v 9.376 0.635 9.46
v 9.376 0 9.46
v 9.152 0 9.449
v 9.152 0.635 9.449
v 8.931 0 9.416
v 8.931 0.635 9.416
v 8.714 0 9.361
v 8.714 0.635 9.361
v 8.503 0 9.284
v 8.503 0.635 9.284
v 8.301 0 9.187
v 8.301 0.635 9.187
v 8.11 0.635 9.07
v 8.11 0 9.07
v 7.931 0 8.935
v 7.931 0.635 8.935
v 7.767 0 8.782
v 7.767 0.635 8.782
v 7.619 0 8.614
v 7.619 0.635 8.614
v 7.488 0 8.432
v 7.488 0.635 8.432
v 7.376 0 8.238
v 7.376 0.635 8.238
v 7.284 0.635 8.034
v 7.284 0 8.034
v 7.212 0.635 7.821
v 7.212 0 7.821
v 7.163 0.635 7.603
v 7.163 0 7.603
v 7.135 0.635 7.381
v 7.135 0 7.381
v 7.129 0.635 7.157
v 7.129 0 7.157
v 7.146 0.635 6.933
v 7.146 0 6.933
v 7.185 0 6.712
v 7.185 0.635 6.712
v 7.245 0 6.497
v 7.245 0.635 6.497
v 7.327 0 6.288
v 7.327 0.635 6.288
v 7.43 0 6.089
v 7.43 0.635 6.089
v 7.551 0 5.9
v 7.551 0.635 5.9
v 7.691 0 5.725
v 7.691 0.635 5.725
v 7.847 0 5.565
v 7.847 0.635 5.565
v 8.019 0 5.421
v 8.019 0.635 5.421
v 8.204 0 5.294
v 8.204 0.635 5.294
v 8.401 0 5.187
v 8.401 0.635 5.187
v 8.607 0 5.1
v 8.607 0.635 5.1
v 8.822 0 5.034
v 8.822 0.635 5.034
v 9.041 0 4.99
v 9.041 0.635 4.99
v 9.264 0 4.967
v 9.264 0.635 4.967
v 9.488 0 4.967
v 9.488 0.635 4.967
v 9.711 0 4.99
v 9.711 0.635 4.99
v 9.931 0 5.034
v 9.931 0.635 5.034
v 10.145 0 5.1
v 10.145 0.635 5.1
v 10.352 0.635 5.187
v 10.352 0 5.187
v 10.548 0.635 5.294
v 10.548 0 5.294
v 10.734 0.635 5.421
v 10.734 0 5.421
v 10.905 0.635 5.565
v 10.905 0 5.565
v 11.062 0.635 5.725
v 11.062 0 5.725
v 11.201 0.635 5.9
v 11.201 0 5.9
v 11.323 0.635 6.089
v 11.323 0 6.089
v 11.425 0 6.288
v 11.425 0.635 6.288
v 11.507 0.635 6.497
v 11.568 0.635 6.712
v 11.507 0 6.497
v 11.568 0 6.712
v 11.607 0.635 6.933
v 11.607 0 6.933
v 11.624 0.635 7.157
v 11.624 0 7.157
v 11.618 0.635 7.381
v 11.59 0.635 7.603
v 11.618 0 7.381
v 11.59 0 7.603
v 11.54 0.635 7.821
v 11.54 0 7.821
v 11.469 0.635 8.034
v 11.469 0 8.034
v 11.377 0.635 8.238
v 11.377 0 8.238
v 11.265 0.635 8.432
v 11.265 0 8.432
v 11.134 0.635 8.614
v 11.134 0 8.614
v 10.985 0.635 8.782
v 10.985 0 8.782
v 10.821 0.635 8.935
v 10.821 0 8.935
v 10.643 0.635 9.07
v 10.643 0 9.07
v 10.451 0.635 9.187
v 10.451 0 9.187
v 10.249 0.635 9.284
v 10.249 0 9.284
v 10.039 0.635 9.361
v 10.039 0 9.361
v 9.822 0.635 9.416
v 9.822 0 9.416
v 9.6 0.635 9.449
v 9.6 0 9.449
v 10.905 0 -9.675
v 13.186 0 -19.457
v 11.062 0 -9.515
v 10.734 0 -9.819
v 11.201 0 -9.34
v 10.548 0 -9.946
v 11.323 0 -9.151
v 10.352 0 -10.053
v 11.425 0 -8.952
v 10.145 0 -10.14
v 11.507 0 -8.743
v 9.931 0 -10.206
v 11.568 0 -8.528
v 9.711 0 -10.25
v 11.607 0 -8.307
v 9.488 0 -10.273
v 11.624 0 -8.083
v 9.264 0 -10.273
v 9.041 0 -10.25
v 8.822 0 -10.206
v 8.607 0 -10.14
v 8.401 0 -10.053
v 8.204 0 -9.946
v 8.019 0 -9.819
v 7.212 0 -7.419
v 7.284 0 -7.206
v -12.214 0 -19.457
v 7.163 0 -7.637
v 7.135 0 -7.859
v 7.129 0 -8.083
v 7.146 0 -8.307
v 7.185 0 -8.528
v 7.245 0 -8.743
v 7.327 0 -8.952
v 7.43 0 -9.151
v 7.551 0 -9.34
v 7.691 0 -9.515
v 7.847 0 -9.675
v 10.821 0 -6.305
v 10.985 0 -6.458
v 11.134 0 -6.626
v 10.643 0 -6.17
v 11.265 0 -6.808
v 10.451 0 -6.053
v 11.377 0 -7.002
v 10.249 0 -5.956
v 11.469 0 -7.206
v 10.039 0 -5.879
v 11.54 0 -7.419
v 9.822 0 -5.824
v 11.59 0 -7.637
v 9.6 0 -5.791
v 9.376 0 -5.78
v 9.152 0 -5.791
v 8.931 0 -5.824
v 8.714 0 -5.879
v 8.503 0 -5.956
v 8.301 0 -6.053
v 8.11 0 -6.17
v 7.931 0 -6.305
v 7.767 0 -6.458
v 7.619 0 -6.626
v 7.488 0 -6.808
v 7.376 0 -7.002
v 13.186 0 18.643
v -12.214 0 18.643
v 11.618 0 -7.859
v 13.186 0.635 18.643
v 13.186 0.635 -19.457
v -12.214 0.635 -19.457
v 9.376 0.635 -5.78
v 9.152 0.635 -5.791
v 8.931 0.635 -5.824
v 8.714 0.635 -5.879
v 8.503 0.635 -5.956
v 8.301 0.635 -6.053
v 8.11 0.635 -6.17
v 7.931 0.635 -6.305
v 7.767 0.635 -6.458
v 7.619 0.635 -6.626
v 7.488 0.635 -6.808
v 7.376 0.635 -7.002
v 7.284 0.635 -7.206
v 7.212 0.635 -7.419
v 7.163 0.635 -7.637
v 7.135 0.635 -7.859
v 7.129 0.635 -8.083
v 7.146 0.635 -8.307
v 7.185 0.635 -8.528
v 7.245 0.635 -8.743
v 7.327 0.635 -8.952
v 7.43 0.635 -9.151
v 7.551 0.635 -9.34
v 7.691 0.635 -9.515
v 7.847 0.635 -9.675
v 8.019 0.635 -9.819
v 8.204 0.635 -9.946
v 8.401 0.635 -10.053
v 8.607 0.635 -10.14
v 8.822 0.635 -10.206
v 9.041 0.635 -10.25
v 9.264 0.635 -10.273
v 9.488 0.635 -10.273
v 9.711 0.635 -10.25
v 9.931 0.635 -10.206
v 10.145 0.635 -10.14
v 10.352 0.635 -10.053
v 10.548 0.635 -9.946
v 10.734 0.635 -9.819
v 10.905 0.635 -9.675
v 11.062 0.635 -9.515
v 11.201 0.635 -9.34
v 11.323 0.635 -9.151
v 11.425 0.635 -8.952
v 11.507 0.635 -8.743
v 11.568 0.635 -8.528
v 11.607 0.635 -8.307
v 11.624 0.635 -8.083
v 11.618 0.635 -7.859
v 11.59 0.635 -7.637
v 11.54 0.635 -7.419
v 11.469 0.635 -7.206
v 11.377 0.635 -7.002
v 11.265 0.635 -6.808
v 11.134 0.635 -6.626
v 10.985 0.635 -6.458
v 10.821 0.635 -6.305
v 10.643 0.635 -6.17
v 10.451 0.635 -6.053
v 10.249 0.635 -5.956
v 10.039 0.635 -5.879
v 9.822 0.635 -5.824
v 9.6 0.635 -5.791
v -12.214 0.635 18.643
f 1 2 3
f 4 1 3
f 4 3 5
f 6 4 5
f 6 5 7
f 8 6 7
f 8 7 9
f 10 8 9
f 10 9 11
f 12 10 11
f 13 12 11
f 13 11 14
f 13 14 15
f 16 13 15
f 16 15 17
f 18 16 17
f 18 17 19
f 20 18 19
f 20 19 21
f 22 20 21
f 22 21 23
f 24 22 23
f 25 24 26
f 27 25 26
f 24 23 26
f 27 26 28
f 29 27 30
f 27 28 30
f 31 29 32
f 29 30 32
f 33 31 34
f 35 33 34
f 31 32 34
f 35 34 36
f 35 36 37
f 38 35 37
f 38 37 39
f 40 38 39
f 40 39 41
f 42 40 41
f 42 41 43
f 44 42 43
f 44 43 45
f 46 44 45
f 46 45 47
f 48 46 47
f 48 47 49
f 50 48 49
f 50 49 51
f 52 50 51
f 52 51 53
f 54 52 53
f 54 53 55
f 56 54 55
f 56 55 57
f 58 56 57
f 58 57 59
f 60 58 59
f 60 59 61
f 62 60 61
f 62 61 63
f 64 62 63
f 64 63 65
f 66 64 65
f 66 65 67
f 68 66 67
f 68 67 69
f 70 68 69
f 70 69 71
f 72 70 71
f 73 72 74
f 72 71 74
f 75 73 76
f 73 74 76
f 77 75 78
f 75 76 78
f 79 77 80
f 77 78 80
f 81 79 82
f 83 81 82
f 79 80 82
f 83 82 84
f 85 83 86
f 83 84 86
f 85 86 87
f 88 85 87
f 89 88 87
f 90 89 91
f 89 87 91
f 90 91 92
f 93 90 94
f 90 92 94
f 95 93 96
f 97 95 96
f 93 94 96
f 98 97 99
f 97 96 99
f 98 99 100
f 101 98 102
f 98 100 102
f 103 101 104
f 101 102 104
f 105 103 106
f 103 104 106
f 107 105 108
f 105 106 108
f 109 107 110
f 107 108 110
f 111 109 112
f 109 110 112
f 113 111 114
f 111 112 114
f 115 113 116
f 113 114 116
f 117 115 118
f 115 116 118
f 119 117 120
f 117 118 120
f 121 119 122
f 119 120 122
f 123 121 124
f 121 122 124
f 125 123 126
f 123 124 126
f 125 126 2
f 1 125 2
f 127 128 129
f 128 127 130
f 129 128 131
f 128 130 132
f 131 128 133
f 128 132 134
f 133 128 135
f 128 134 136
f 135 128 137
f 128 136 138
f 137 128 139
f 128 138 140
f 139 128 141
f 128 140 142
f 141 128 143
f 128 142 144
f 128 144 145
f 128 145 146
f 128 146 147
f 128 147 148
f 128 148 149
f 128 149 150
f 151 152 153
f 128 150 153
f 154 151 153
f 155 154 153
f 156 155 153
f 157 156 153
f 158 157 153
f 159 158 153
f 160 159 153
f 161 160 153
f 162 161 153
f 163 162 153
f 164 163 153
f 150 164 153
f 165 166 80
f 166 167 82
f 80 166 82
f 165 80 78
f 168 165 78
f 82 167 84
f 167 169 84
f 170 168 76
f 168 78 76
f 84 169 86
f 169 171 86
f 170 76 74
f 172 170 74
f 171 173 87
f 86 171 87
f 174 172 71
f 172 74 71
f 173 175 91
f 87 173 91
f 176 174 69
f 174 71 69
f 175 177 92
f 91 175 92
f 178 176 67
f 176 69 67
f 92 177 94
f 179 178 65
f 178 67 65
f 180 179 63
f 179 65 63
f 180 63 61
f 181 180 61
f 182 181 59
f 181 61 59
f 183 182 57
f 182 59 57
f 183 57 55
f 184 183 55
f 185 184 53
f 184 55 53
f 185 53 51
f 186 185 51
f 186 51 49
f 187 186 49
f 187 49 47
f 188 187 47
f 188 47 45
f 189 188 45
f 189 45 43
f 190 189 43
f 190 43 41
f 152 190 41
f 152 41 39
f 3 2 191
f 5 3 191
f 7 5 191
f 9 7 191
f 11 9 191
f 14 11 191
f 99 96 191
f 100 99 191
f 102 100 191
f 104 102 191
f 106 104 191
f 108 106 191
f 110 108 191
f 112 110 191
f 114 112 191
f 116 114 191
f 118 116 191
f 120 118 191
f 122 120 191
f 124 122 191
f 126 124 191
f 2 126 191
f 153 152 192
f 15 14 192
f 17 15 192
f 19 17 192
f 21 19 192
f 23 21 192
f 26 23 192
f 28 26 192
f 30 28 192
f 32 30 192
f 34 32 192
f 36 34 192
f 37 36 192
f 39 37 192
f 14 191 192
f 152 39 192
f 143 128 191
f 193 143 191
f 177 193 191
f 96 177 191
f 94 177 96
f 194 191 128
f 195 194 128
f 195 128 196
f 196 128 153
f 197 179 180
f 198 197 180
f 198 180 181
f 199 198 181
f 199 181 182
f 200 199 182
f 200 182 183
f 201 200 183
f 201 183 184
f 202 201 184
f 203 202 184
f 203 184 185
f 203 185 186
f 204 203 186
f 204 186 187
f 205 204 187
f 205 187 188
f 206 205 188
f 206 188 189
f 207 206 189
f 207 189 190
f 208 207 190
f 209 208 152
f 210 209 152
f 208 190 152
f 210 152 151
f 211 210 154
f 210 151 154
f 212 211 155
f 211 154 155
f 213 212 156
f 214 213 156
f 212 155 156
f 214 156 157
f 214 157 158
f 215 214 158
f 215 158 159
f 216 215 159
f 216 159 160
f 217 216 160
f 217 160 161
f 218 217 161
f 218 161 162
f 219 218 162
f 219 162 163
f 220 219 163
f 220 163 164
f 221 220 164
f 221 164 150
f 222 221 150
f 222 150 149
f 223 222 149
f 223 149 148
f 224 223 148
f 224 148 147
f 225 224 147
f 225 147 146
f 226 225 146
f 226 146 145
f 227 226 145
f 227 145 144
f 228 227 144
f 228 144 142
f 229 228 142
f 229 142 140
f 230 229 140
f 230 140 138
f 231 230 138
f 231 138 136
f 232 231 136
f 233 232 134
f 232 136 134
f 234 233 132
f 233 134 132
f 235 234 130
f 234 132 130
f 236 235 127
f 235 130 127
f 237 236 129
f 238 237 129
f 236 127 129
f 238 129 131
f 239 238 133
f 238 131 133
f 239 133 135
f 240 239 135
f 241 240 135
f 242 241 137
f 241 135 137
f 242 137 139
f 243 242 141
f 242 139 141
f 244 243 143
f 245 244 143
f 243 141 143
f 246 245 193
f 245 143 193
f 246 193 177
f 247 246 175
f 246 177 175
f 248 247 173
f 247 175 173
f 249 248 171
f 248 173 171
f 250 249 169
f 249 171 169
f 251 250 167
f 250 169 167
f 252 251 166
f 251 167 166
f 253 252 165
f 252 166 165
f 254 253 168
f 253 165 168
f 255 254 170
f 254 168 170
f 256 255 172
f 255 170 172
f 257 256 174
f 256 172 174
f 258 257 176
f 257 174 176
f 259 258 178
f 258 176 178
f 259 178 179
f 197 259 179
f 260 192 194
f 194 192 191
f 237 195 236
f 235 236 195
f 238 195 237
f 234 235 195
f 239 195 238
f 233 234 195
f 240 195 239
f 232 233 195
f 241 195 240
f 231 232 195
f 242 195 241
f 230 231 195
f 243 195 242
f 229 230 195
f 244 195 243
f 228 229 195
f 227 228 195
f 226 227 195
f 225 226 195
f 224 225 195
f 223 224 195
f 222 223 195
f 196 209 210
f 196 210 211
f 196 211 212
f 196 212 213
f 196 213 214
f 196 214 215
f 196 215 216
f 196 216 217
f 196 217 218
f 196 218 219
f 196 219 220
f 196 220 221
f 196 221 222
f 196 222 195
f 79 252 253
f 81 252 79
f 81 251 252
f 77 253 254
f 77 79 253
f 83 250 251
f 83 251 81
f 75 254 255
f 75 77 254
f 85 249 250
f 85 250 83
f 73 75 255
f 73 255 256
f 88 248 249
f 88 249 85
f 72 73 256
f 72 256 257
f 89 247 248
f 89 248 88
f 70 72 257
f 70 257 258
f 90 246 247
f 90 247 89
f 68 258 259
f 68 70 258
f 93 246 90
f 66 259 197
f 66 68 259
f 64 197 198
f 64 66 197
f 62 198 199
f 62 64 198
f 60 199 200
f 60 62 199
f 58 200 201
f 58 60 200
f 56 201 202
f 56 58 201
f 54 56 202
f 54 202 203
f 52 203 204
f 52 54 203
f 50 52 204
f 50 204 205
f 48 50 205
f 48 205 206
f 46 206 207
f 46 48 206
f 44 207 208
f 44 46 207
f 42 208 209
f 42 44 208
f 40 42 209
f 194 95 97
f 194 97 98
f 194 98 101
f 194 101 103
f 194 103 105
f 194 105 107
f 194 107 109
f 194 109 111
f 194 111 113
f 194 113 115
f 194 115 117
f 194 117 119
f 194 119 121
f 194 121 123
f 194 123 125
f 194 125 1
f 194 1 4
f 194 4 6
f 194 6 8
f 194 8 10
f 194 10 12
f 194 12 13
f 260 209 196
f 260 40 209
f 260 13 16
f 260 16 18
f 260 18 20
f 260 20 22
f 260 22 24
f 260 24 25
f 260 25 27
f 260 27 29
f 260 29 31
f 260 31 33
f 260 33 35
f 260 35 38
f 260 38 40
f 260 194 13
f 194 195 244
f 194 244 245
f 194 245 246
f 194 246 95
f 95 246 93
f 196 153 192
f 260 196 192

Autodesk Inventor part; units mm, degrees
ref_plane "YZ Plane" through (0, 0, 0) normal (1, 0, 0) x (0, 1, 0)
ref_plane "XZ Plane" through (0, 0, 0) normal (0, 1, 0) x (-1, 0, 0)
ref_plane "XY Plane" through (0, 0, 0) normal (0, 0, 1) x (1, 0, 0)
sketch "Sketch1" plane through (0, 0, 0) normal (0, 1, 0) x (-1, 0, 0)
  line L0 (12.2137, 18.6426) -> (-13.1863, 18.6426)
  line L1 (-13.1863, 18.6426) -> (-13.1863, -19.4574)
  line L2 (-13.1863, -19.4574) -> (12.2137, -19.4574)
  line L3 (12.2137, -19.4574) -> (12.2137, 18.6426)
  point P0 (0, 0)
  dimension "d0" = 25.4
  dimension "d1" = 38.1
extrude "Extrusion1" add sketch "Sketch1" along normal blind 0.635
hole "Hole1" at (9.3763, 0.635, 7.2126) direction (0, -1, 0) diameter 4.4958 depth 0.635 clearance for "Flat Head Machine Screw (82)" size "#8" standard "Ansi Unified Screw Threads"
hole "Hole5" at (9.3763, 0.635, -8.0274) direction (0, -1, 0) diameter 4.4958 depth 25.4 clearance for "Flat Head Machine Screw (82)" size "#8" standard "Ansi Unified Screw Threads"
properties part number "Shielding side"
